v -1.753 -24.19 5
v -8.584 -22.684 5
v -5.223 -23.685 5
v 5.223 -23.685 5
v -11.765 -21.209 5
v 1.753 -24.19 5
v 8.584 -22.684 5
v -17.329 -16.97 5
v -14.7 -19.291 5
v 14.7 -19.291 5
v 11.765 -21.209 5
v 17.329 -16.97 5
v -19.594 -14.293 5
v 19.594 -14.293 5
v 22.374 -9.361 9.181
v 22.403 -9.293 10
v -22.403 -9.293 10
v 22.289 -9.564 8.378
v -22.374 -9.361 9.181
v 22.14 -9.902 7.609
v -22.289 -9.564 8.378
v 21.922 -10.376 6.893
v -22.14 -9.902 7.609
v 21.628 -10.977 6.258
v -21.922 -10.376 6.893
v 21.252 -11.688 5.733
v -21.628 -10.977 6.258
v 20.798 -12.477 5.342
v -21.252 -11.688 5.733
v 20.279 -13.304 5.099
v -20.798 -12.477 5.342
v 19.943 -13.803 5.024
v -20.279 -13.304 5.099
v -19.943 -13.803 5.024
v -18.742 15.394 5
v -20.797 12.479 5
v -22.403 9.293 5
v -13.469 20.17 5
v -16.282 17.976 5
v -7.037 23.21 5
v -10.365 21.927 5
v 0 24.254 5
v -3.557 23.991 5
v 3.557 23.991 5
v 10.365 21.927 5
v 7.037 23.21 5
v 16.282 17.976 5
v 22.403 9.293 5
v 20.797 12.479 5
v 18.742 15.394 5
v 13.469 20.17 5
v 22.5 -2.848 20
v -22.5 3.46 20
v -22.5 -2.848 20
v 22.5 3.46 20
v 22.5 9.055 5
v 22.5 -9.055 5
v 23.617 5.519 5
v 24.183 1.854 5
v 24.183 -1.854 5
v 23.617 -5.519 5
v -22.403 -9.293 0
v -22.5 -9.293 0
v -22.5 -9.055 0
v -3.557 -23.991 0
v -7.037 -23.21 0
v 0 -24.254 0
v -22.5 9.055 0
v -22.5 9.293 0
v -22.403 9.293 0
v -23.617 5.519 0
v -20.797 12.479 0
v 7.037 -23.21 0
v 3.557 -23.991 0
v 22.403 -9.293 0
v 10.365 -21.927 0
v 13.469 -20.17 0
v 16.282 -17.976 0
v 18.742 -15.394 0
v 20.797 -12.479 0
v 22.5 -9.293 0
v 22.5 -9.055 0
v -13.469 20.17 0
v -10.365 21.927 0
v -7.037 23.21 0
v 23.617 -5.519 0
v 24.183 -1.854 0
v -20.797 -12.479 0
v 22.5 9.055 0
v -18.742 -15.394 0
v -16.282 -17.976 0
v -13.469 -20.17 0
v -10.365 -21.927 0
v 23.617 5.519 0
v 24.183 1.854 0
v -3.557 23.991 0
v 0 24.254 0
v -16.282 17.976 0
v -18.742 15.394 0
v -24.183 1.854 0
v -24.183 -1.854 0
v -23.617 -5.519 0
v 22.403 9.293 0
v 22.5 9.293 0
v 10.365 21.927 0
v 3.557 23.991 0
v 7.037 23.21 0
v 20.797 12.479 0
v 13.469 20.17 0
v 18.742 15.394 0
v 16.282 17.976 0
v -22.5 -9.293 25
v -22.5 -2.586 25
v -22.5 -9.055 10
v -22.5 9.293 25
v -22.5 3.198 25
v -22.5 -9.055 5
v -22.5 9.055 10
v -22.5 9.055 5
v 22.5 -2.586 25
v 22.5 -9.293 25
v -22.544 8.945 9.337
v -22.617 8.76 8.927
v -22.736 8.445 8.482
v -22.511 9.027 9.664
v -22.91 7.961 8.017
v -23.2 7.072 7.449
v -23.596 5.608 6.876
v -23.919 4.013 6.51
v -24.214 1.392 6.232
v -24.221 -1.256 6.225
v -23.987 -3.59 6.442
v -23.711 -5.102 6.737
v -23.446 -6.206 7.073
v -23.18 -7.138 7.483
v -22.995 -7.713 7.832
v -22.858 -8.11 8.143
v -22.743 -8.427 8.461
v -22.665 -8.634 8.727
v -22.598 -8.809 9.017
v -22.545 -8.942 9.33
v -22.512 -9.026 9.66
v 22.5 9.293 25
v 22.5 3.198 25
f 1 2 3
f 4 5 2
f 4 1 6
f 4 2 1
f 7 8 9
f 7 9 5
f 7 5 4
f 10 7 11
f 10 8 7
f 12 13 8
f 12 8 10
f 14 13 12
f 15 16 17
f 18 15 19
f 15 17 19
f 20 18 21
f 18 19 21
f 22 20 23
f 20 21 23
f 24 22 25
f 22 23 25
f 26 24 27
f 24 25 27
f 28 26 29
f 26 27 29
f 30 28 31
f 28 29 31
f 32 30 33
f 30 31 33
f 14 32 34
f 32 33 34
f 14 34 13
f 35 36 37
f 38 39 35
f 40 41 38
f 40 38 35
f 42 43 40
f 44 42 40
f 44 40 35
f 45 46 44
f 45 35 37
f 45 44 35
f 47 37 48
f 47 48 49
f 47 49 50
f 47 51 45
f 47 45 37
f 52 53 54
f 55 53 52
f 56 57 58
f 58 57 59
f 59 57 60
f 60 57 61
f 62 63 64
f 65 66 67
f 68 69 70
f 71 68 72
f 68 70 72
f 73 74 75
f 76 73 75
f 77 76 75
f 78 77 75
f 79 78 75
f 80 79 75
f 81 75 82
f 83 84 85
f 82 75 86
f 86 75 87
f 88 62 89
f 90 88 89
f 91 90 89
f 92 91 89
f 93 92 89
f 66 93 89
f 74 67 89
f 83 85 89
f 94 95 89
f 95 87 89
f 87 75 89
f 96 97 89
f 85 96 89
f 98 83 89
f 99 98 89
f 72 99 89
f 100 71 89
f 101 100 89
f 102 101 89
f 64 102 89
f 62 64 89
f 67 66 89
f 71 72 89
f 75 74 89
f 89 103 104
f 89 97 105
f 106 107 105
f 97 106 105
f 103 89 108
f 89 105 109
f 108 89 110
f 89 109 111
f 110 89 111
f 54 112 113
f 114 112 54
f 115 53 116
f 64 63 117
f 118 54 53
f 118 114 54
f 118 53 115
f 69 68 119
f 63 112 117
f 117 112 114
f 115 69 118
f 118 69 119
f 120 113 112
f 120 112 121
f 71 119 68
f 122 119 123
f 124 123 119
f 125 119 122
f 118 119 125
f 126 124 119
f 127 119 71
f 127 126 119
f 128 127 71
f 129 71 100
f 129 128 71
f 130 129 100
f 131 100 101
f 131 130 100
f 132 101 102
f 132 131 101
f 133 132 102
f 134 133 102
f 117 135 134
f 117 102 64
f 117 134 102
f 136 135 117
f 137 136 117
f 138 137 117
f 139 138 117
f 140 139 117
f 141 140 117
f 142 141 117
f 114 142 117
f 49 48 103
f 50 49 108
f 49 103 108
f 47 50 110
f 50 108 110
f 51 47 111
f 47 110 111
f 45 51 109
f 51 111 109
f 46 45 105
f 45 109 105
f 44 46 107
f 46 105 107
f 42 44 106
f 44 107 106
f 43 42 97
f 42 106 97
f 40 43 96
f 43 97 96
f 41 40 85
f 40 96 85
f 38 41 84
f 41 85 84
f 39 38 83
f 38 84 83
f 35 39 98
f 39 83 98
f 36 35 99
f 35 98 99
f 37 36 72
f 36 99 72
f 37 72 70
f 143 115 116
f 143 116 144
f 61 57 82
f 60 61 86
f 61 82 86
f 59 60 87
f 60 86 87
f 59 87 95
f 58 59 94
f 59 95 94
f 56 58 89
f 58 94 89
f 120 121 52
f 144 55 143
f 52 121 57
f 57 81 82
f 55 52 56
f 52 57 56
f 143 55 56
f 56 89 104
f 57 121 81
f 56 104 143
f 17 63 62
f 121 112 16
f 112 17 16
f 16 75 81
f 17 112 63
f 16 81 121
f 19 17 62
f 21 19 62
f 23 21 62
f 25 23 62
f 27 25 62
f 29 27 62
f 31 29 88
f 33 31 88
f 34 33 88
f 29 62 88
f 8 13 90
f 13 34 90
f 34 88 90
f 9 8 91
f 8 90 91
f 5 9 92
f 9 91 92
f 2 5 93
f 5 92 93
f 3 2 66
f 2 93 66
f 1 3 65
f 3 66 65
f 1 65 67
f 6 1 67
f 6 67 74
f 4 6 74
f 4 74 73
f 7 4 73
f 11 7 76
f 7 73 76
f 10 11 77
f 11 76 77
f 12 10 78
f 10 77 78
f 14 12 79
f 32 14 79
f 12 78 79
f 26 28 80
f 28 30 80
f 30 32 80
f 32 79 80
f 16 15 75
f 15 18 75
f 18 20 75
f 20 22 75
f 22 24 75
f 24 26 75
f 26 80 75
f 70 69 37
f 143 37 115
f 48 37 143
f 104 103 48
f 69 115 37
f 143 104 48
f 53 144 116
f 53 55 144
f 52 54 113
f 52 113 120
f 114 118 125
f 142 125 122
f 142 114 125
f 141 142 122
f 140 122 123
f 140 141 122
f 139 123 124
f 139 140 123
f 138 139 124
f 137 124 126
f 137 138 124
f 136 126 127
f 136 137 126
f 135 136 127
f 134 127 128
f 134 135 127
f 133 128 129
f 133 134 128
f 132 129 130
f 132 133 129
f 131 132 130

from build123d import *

# Parameters (mm, degrees)
F0_R        = 24.2537643176
F1_DEPTH    = 5
F2_W        = 45.0000017881
F2_H        = 18.5869578272
F3_DEPTH    = 25
F4_W        = 45.0000017881
F4_H        = 5.7842824608
F5_DEPTH    = 5
F6_DEPTH    = 5
F6_TAPER    = -3
F7_DEPTH    = 5
F7_TAPER    = -3
F8_R        = 5
F9_T4_DEPTH = 43.1102228968
F9_S5_R     = 24.2537643176
F9_T6_DEPTH = 23


# Not quite as in the source:
# - a fillet or chamfer that OpenCascade refuses, or shapes differently, is made with other operations: its cross-section is extruded or revolved along the edge and cut away or added


with BuildPart() as f1:
    # F0 (on Top) → F1 (new body)
    with BuildSketch(Plane.XY):
        Circle(F0_R)
    extrude(amount=F1_DEPTH)

    # F2 (on Top) → F3 (join)
    with BuildSketch(Plane.XY):
        Rectangle(F2_W, F2_H)
    extrude(amount=F3_DEPTH)

    # F4 (on face) → F5 (join)
    with BuildSketch(Plane.XY.offset(25)):
        with Locations((0, 0.3060454037)):
            Rectangle(F4_W, F4_H)
    extrude(amount=-F5_DEPTH)

    # F4 (on face) → F6 (join)
    with BuildSketch(Plane.XY.offset(25)):
        with Locations((0, 0.3060454037)):
            Rectangle(F4_W, F4_H)
    extrude(amount=-F6_DEPTH, taper=F6_TAPER)

    # F4 (on face) → F7 (cut)
    with BuildSketch(Plane.XY.offset(25)):
        with Locations((0, 0.3060454037)):
            Rectangle(F4_W, F4_H)
    extrude(amount=-F7_DEPTH, taper=F7_TAPER, mode=Mode.SUBTRACT)

    # F8
    f8_edges = [f1.edges().sort_by_distance(p)[0] for p in [
        (0, -9.293479, 5),
    ]]
    fillet(f8_edges, radius=F8_R)

    # F9: fillet of radius 5 on 1 edges, made by hand


with BuildPart() as f9_tool2:
    # F9_s3 → F9_t4 (new body)
    with BuildSketch(Plane.XZ.offset(21.5551114484)):
        with BuildLine():
            ThreePointArc((-22.5000008941, 10), (-23.9644669881, 6.4644660941), (-27.5000008941, 5))
            Line((-27.5000008941, 5), (-22.5000008941, 5))
            Line((-22.5000008941, 5), (-22.5000008941, 10))
        make_face()
    extrude(amount=-F9_T4_DEPTH)

    # F9_s5 → F9_t6 (intersect, symmetric)
    with BuildSketch(Plane.XY.offset(7.5)):
        Circle(F9_S5_R)
    extrude(amount=F9_T6_DEPTH, both=True, mode=Mode.INTERSECT)


with BuildPart() as f1_1:
    add(f1.part)

    # F9_t1: union F9_tool2
    add(f9_tool2.part)


solid = f1_1.part
